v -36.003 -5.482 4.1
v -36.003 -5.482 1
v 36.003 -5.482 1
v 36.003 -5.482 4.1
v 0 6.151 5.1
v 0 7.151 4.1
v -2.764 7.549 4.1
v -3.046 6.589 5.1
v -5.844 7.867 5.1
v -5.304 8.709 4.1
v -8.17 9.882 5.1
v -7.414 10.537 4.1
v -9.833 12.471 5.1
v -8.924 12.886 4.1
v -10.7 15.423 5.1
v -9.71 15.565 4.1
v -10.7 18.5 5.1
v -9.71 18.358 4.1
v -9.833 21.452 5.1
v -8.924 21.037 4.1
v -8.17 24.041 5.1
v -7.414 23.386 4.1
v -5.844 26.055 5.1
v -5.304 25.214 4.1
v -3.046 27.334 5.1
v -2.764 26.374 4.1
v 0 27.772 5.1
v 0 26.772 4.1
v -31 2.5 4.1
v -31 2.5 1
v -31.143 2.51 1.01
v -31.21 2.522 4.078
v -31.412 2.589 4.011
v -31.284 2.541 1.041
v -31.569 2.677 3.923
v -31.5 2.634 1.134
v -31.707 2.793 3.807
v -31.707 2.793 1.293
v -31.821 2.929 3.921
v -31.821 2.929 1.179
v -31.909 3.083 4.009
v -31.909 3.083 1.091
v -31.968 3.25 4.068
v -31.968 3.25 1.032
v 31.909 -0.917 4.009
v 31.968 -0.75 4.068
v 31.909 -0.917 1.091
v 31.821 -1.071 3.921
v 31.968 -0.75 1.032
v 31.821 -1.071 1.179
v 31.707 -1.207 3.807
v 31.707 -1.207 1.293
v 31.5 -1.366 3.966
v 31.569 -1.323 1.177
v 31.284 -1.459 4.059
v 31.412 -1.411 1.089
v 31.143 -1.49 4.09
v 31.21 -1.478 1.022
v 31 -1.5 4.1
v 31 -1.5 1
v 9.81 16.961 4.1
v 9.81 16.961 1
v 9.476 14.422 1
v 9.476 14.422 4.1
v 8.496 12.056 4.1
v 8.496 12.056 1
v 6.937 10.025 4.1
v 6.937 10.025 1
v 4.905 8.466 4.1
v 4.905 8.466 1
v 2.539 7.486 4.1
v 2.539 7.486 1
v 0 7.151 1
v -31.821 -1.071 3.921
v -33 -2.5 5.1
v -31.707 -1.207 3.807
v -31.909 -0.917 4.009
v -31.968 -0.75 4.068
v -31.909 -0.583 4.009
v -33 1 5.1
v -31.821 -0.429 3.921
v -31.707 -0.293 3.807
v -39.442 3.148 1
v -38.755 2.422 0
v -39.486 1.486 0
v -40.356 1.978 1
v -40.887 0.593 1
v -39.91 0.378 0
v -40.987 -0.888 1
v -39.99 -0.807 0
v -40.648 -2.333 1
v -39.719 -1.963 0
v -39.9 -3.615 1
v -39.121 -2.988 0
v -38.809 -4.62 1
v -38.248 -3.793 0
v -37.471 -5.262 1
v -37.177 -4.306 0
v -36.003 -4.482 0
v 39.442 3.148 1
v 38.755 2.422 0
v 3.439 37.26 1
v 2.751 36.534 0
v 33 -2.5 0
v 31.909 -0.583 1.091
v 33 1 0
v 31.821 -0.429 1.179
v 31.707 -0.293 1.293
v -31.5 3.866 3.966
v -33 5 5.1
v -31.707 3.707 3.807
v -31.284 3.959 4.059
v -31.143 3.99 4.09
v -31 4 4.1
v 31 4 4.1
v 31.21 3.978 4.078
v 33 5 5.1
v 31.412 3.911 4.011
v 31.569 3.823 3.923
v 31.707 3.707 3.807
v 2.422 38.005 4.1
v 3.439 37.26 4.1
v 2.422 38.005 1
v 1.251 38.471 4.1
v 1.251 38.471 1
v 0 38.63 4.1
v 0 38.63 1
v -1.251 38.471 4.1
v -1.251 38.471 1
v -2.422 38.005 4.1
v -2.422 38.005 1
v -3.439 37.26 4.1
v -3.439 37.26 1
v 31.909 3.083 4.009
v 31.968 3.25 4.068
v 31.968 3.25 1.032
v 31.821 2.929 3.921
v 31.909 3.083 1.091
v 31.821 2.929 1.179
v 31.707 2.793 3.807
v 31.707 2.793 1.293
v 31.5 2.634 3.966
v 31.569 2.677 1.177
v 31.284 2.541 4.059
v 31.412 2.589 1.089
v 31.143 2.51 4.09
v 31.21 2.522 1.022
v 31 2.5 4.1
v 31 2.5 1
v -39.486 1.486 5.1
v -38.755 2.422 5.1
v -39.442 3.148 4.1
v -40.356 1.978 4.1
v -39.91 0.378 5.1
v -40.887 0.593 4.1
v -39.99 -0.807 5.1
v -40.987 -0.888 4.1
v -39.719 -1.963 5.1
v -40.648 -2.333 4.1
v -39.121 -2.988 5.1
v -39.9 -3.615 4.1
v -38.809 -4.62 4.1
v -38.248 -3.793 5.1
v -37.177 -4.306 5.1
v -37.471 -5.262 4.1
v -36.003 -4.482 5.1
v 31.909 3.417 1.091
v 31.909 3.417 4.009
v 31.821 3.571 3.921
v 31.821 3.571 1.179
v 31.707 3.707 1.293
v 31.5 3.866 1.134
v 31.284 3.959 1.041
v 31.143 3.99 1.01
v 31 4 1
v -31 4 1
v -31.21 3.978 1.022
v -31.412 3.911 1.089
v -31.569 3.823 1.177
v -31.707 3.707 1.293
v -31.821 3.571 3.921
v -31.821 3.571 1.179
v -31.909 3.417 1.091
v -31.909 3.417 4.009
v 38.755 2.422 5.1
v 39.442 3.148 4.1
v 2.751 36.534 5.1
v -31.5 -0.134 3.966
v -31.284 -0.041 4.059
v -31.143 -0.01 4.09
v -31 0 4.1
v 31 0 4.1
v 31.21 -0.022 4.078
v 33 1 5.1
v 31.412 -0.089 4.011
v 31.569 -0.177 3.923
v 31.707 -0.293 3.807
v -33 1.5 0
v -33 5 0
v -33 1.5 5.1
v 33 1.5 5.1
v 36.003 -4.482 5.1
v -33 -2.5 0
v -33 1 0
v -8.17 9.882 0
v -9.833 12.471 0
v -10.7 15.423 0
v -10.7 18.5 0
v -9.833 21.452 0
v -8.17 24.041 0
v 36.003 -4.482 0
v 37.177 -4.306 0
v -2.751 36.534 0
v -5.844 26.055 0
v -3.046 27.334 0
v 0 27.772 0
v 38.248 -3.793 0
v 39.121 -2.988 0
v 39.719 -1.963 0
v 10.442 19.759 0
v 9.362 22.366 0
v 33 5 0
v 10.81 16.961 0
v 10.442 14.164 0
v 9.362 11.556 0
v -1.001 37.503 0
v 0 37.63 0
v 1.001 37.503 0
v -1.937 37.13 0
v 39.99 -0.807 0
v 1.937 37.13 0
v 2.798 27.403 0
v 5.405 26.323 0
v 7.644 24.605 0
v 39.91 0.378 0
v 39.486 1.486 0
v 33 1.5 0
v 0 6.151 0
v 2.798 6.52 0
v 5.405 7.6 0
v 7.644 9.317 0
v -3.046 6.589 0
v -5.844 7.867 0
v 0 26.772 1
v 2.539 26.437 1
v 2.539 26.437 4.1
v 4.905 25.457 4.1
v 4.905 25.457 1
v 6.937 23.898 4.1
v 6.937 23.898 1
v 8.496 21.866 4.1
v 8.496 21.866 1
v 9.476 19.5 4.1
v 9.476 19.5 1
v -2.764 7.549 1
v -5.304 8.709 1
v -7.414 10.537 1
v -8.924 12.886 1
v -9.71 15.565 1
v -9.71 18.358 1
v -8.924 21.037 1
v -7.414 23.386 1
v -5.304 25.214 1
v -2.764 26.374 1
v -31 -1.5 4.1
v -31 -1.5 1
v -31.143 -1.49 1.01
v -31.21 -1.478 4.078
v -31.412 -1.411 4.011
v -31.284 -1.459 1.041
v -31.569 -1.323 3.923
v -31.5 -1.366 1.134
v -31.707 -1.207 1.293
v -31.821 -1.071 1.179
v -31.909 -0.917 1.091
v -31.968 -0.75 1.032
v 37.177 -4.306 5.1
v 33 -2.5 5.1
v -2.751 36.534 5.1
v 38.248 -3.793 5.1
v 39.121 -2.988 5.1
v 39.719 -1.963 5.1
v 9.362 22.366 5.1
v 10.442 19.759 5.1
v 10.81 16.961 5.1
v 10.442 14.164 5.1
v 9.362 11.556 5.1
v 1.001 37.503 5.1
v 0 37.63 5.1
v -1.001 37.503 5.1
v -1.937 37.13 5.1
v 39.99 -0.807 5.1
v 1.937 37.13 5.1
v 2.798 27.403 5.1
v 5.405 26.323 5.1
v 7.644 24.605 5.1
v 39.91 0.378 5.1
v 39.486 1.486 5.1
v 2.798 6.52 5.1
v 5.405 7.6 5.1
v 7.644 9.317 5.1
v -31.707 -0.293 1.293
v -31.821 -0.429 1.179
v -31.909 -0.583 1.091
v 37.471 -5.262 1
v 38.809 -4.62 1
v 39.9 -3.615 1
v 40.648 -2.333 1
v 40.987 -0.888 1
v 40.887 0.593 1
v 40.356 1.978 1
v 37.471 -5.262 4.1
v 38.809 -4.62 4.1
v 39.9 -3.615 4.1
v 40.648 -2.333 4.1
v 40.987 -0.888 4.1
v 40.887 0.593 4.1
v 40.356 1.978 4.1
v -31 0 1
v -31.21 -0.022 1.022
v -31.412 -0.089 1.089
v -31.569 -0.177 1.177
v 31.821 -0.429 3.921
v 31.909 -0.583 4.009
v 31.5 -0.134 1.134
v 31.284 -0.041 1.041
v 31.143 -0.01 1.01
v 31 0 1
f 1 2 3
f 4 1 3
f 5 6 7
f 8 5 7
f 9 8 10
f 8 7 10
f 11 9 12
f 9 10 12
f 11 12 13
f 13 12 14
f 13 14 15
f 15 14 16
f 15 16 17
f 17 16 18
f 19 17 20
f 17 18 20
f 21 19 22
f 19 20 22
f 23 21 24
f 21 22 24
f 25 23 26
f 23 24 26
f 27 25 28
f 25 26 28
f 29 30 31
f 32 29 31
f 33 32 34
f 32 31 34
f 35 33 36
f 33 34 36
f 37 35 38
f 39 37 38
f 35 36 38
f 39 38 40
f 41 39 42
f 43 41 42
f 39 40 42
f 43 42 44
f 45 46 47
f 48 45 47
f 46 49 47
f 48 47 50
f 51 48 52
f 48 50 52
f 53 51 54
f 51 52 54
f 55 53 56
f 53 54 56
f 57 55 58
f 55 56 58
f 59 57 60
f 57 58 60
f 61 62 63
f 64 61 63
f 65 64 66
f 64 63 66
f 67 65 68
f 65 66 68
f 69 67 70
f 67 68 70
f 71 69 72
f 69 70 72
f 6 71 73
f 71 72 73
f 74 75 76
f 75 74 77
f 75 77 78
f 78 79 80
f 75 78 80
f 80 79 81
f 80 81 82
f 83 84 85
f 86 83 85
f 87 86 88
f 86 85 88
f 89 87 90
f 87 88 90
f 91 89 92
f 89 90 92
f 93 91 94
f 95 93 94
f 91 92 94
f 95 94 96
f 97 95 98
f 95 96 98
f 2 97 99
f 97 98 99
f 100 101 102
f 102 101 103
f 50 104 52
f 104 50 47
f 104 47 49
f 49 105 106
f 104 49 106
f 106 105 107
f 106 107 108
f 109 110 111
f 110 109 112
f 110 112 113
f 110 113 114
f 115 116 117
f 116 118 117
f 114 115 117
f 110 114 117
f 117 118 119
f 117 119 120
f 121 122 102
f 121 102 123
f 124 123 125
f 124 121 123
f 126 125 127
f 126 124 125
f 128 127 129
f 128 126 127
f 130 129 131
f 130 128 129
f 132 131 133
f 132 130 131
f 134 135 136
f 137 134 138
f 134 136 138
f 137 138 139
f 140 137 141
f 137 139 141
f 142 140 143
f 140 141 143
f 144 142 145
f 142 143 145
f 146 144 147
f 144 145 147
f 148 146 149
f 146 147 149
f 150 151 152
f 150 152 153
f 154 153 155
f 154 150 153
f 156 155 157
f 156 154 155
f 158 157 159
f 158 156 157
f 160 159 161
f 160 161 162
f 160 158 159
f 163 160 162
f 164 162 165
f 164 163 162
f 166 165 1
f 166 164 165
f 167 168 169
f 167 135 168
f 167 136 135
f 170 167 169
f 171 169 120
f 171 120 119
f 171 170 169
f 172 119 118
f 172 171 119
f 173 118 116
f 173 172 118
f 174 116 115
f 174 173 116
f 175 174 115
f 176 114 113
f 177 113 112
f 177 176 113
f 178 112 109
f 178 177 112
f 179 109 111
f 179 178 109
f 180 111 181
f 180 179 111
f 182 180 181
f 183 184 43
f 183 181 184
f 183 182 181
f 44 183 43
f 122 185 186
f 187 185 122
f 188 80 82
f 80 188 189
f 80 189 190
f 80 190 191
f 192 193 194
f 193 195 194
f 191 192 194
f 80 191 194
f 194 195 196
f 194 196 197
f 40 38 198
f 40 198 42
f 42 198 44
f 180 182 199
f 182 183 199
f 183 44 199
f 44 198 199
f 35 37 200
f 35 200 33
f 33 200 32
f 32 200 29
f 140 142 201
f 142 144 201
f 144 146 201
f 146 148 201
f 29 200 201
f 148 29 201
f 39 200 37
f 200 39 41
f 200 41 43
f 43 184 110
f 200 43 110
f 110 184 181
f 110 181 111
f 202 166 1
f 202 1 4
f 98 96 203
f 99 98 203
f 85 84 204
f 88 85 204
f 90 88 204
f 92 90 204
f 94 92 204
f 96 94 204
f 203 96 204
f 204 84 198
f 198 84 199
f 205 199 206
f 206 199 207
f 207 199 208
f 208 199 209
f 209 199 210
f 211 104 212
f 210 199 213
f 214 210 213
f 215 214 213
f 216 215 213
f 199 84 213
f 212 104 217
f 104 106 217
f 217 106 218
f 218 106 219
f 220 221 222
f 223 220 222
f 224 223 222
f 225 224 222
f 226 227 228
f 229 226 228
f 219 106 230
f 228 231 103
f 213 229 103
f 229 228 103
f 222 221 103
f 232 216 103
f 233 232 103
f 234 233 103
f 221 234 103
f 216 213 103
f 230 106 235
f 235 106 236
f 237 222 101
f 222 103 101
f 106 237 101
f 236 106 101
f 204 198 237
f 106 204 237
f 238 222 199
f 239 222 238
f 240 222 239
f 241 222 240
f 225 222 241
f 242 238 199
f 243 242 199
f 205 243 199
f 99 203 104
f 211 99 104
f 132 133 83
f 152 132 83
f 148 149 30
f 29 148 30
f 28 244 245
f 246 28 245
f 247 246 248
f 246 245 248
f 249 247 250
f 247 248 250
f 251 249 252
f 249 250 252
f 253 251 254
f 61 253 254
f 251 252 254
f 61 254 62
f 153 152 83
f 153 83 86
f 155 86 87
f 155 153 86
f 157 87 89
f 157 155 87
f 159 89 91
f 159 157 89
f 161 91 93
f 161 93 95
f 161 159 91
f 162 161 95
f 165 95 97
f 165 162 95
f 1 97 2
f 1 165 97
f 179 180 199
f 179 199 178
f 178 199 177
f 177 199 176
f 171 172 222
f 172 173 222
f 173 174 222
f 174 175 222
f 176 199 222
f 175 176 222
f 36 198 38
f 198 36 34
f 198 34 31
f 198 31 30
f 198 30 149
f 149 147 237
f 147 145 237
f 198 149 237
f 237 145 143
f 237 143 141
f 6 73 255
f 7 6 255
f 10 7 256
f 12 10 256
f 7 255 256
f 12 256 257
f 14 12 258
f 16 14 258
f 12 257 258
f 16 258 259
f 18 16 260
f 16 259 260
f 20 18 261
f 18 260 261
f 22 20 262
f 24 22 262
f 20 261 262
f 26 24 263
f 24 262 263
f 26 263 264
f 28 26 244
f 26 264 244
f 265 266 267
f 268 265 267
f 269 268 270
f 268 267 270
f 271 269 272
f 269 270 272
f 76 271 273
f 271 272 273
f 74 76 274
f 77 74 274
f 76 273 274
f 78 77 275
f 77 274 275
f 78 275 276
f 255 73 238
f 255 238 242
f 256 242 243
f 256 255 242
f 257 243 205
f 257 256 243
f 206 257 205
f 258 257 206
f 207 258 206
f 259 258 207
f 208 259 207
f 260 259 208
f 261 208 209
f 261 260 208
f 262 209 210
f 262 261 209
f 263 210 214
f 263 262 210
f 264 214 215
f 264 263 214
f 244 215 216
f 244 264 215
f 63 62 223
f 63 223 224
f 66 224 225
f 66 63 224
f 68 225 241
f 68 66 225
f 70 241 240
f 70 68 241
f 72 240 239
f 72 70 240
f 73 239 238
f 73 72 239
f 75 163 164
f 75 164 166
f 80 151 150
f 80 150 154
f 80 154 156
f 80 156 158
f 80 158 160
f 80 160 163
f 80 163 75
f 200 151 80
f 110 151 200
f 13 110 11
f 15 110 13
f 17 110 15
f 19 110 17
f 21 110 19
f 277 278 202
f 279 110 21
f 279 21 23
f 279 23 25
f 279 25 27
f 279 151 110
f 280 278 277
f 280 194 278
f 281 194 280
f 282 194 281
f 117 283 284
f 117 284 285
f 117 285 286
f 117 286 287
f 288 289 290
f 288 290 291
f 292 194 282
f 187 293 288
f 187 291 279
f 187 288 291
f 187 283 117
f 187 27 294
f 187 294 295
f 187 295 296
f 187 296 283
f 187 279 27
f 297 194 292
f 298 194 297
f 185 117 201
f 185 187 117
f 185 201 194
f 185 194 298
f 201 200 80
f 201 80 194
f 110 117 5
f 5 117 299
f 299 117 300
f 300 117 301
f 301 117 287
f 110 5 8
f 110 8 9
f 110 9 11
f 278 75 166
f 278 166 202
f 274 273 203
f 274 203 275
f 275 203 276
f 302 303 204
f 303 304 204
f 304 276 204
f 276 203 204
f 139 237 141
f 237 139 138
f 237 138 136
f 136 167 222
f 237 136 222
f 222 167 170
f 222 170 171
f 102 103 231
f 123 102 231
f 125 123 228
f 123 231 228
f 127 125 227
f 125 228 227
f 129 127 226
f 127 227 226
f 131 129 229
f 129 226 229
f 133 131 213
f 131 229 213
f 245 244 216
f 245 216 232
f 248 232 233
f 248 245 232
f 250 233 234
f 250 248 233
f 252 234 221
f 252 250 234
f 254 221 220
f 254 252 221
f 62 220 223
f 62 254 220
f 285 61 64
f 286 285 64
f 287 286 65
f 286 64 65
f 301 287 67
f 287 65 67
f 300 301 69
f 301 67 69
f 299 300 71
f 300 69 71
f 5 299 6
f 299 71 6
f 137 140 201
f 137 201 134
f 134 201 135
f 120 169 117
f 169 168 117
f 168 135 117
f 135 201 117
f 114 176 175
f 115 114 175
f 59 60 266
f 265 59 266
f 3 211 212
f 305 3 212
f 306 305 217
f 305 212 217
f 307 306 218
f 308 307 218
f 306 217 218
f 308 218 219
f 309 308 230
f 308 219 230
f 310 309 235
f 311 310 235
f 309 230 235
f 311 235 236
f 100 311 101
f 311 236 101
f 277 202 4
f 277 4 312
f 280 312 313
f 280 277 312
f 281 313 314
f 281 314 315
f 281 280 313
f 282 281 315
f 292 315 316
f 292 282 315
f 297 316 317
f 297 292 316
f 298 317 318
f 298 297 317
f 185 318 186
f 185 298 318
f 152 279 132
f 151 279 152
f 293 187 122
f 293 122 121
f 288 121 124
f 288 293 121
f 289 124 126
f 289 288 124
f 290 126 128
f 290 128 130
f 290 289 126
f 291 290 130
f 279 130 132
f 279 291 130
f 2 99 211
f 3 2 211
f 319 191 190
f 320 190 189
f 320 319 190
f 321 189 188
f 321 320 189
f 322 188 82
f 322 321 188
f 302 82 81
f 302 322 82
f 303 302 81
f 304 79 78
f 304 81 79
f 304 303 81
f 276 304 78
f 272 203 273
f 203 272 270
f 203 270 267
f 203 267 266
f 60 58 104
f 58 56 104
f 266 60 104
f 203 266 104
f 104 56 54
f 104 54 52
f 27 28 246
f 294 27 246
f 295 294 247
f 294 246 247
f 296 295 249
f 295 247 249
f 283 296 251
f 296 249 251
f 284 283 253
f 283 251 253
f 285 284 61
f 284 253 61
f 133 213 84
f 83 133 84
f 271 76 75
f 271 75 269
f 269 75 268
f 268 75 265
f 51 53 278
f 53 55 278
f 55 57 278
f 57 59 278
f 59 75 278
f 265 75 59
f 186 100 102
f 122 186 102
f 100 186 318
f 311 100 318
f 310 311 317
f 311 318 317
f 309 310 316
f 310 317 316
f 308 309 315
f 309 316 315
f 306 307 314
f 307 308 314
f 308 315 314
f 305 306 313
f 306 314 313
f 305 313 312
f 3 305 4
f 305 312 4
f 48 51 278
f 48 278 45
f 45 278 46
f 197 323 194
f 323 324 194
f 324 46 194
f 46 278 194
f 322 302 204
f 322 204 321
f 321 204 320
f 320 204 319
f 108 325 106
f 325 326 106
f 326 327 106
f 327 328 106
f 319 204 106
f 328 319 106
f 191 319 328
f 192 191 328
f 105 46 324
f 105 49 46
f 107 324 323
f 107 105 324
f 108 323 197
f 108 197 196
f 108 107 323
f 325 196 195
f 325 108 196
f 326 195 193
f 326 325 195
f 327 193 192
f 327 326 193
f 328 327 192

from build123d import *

# Parameters (mm, degrees)
F1_DEPTH      = 5.1
F2_R          = 5
F3_SIZE       = 1
F4_T4_DEPTH   = 8.1
F4_T10_DEPTH  = 8.1
F4_T16_DEPTH  = 8.1
F4_T24_DEPTH  = 8.1
F4_T30_DEPTH  = 8.1
F4_T36_DEPTH  = 8.1
F4_T42_DEPTH  = 8.1
F4_T48_DEPTH  = 8.1
F4_T56_DEPTH  = 8.1
F4_T62_DEPTH  = 8.1
F4_T68_DEPTH  = 8.1
F4_T74_DEPTH  = 8.1
F4_T80_DEPTH  = 8.1
F4_T88_DEPTH  = 8.1
F4_T94_DEPTH  = 8.1
F4_T100_DEPTH = 8.1
F4_T106_DEPTH = 8.1
F4_T112_DEPTH = 8.1
F4_T120_DEPTH = 8.1
F4_T126_DEPTH = 8.1
F4_T132_DEPTH = 8.1
F4_T138_DEPTH = 8.1
F4_T144_DEPTH = 8.1
F4_T152_DEPTH = 8.1
F4_T158_DEPTH = 8.1
F4_T164_DEPTH = 8.1
F4_T170_DEPTH = 8.1
F4_T176_DEPTH = 8.1
F4_T184_DEPTH = 8.1
F4_T190_DEPTH = 8.1
F4_T196_DEPTH = 8.1
F4_T202_DEPTH = 8.1
F4_T208_DEPTH = 8.1
F4_T216_DEPTH = 8.1
F4_T222_DEPTH = 8.1
F4_T228_DEPTH = 8.1
F4_T234_DEPTH = 8.1
F4_T240_DEPTH = 8.1
F4_T248_DEPTH = 8.1
F4_T254_DEPTH = 8.1


# Not quite as in the source:
# - a fillet or chamfer that OpenCascade refuses, or shapes differently, is made with other operations: its cross-section is extruded or revolved along the edge and cut away or added


with BuildPart() as f1:
    # F0 (on Top) → F1 (new body)
    with BuildSketch(Plane.XY):
        with BuildLine():
            Line((0, 2.5), (0, 0))
            Line((0, 0), (32, 0))
            Line((32, 0), (32, -1.5))
            Line((32, -1.5), (0, -1.5))
            Line((0, -1.5), (0, -5.4818979414))
            Line((0, -5.4818979414), (48.5503548798, -5.4818979414))
            Line((48.5503548798, -5.4818979414), (0, 40.5181020586))
            Line((0, 40.5181020586), (0, 26.7715353826))
            ThreePointArc((0, 26.7715353826), (6.9368136311, 23.8982130969), (9.8101359168, 16.9613994658))
            ThreePointArc((9.8101359168, 16.9613994658), (6.9368136311, 10.0245858347), (0, 7.151263549))
            Line((0, 7.151263549), (0, 4))
            Line((0, 4), (32, 4))
            Line((32, 4), (32, 2.5))
            Line((32, 2.5), (0, 2.5))
        make_face()
        with BuildLine():
            Line((-32, -1.5), (-32, 0))
            Line((-32, 0), (0, 0))
            Line((0, 0), (0, 2.5))
            Line((0, 2.5), (-32, 2.5))
            Line((-32, 2.5), (-32, 4))
            Line((-32, 4), (0, 4))
            Line((0, 4), (0, 7.151263549))
            ThreePointArc((0, 7.151263549), (-9.8101359168, 16.9613994658), (0, 26.7715353826))
            Line((0, 26.7715353826), (0, 40.5181020586))
            Line((0, 40.5181020586), (-48.5503548798, -5.4818979414))
            Line((-48.5503548798, -5.4818979414), (0, -5.4818979414))
            Line((0, -5.4818979414), (0, -1.5))
            Line((0, -1.5), (-32, -1.5))
        make_face()
    extrude(amount=F1_DEPTH)

    # F2
    f2_edges = [f1.edges().sort_by_distance(p)[0] for p in [
        (-48.550355, -5.481898, 2.55),
        (48.550355, -5.481898, 2.55),
        (0, 40.518102, 2.55),
    ]]
    fillet(f2_edges, radius=F2_R)

    # F3
    f3_edges = [f1.edges().sort_by_distance(p)[0] for p in [
        (21.440624, 20.203756, 5.1),
        (40.648189, -2.332857, 5.1),
        (0, 38.630252, 5.1),
        (0, -5.481898, 5.1),
        (-21.440624, 20.203756, 5.1),
        (-40.648189, -2.332857, 5.1),
        (32, 3.25, 5.1),
        (0, 2.5, 5.1),
        (-32, 3.25, 5.1),
        (0, 4, 5.1),
        (32, -0.75, 5.1),
        (0, -1.5, 5.1),
        (-32, -0.75, 5.1),
        (0, 0, 5.1),
        (-9.810136, 16.961399, 5.1),
        (21.440624, 20.203756, 0),
        (40.648189, -2.332857, 0),
        (0, 38.630252, 0),
        (0, -5.481898, 0),
        (-21.440624, 20.203756, 0),
        (-40.648189, -2.332857, 0),
        (32, 3.25, 0),
        (0, 2.5, 0),
        (-32, 3.25, 0),
        (0, 4, 0),
        (32, -0.75, 0),
        (0, -1.5, 0),
        (-32, -0.75, 0),
        (0, 0, 0),
        (-9.810136, 16.961399, 0),
    ]]
    chamfer(f3_edges, length=F3_SIZE)

    # F4: fillet of radius 1 on 8 edges, made by hand


with BuildPart() as f4_tool2:
    # F4_s3 → F4_t4 (new body)
    with BuildSketch(Plane.XY.offset(-1.5)):
        with BuildLine():
            ThreePointArc((32, 3.5), (31.7071067812, 2.7928932188), (31, 2.5))
            Line((31, 2.5), (32, 2.5))
            Line((32, 2.5), (32, 3.5))
        make_face()
    extrude(amount=F4_T4_DEPTH)

    split(bisect_by=Plane(origin=(16.5, 0, 16.5), x_dir=(0, 1, 0), z_dir=(-0.7071067812, 0, -0.7071067812)), keep=Keep.TOP)

    split(bisect_by=Plane(origin=(0, 0.75, -0.75), x_dir=(1, 0, 0), z_dir=(0, -0.7071067812, 0.7071067812)), keep=Keep.TOP)


with BuildPart() as f1_1:
    add(f1.part)

    # F4_t1: union F4_tool2
    add(f4_tool2.part)


with BuildPart() as f4_tool8:
    # F4_s9 → F4_t10 (new body)
    with BuildSketch(Plane.XY.offset(-1.5)):
        with BuildLine():
            ThreePointArc((32, 3.5), (31.7071067812, 2.7928932188), (31, 2.5))
            Line((31, 2.5), (32, 2.5))
            Line((32, 2.5), (32, 3.5))
        make_face()
    extrude(amount=F4_T10_DEPTH)

    split(bisect_by=Plane(origin=(16.5, 0, 16.5), x_dir=(0, 1, 0), z_dir=(0.7071067812, 0, 0.7071067812)), keep=Keep.TOP)

    split(bisect_by=Plane(origin=(0, 0.75, -0.75), x_dir=(1, 0, 0), z_dir=(0, 0.7071067812, -0.7071067812)), keep=Keep.TOP)


with BuildPart() as f1_2:
    add(f1_1.part)

    # F4_t7: union F4_tool8
    add(f4_tool8.part)


with BuildPart() as f4_tool14:
    # F4_s15 → F4_t16 (new body)
    with BuildSketch(Plane.XY.offset(-1.5)):
        with BuildLine():
            ThreePointArc((32, 3.5), (31.7071067812, 2.7928932188), (31, 2.5))
            Line((31, 2.5), (32, 2.5))
            Line((32, 2.5), (32, 3.5))
        make_face()
    extrude(amount=F4_T16_DEPTH)

    split(bisect_by=Plane(origin=(16.5, 0, 16.5), x_dir=(0, 1, 0), z_dir=(0.7071067812, 0, 0.7071067812)), keep=Keep.TOP)

    split(bisect_by=Plane(origin=(0, 0.75, -0.75), x_dir=(1, 0, 0), z_dir=(0, -0.7071067812, 0.7071067812)), keep=Keep.TOP)

    split(bisect_by=Plane(origin=(13.95, 0, -13.95), x_dir=(0, 1, 0), z_dir=(0.7071067812, 0, -0.7071067812)), keep=Keep.TOP)

    split(bisect_by=Plane(origin=(0, 3.3, 3.3), x_dir=(1, 0, 0), z_dir=(0, -0.7071067812, -0.7071067812)), keep=Keep.TOP)


with BuildPart() as f1_3:
    add(f1_2.part)

    # F4_t13: union F4_tool14
    add(f4_tool14.part)


with BuildPart() as f4_tool22:
    # F4_s23 → F4_t24 (new body)
    with BuildSketch(Plane.XY.offset(-1.5)):
        with BuildLine():
            ThreePointArc((32, 3.5), (31.7071067812, 2.7928932188), (31, 2.5))
            Line((31, 2.5), (32, 2.5))
            Line((32, 2.5), (32, 3.5))
        make_face()
    extrude(amount=F4_T24_DEPTH)

    split(bisect_by=Plane(origin=(13.95, 0, -13.95), x_dir=(0, 1, 0), z_dir=(-0.7071067812, 0, 0.7071067812)), keep=Keep.TOP)

    split(bisect_by=Plane(origin=(0, 3.3, 3.3), x_dir=(1, 0, 0), z_dir=(0, -0.7071067812, -0.7071067812)), keep=Keep.TOP)


with BuildPart() as f1_4:
    add(f1_3.part)

    # F4_t21: union F4_tool22
    add(f4_tool22.part)


with BuildPart() as f4_tool28:
    # F4_s29 → F4_t30 (new body)
    with BuildSketch(Plane.XY.offset(-1.5)):
        with BuildLine():
            ThreePointArc((32, 3.5), (31.7071067812, 2.7928932188), (31, 2.5))
            Line((31, 2.5), (32, 2.5))
            Line((32, 2.5), (32, 3.5))
        make_face()
    extrude(amount=F4_T30_DEPTH)

    split(bisect_by=Plane(origin=(13.95, 0, -13.95), x_dir=(0, 1, 0), z_dir=(0.7071067812, 0, -0.7071067812)), keep=Keep.TOP)

    split(bisect_by=Plane(origin=(0, 3.3, 3.3), x_dir=(1, 0, 0), z_dir=(0, 0.7071067812, 0.7071067812)), keep=Keep.TOP)


with BuildPart() as f1_5:
    add(f1_4.part)

    # F4_t27: union F4_tool28
    add(f4_tool28.part)


with BuildPart() as f4_tool34:
    # F4_s35 → F4_t36 (new body)
    with BuildSketch(Plane.XY.offset(-1.5)):
        with BuildLine():
            ThreePointArc((32, -1), (31.7071067812, -0.2928932188), (31, 0))
            Line((31, 0), (32, 0))
            Line((32, 0), (32, -1))
        make_face()
    extrude(amount=F4_T36_DEPTH)

    split(bisect_by=Plane(origin=(16.5, 0, 16.5), x_dir=(0, 1, 0), z_dir=(-0.7071067812, 0, -0.7071067812)), keep=Keep.TOP)

    split(bisect_by=Plane(origin=(0, 0.5, 0.5), x_dir=(1, 0, 0), z_dir=(0, 0.7071067812, 0.7071067812)), keep=Keep.TOP)


with BuildPart() as f1_6:
    add(f1_5.part)

    # F4_t33: union F4_tool34
    add(f4_tool34.part)


with BuildPart() as f4_tool40:
    # F4_s41 → F4_t42 (new body)
    with BuildSketch(Plane.XY.offset(-1.5)):
        with BuildLine():
            ThreePointArc((32, -1), (31.7071067812, -0.2928932188), (31, 0))
            Line((31, 0), (32, 0))
            Line((32, 0), (32, -1))
        make_face()
    extrude(amount=F4_T42_DEPTH)

    split(bisect_by=Plane(origin=(16.5, 0, 16.5), x_dir=(0, 1, 0), z_dir=(0.7071067812, 0, 0.7071067812)), keep=Keep.TOP)

    split(bisect_by=Plane(origin=(0, 0.5, 0.5), x_dir=(1, 0, 0), z_dir=(0, -0.7071067812, -0.7071067812)), keep=Keep.TOP)


with BuildPart() as f1_7:
    add(f1_6.part)

    # F4_t39: union F4_tool40
    add(f4_tool40.part)


with BuildPart() as f4_tool46:
    # F4_s47 → F4_t48 (new body)
    with BuildSketch(Plane.XY.offset(-1.5)):
        with BuildLine():
            ThreePointArc((32, -1), (31.7071067812, -0.2928932188), (31, 0))
            Line((31, 0), (32, 0))
            Line((32, 0), (32, -1))
        make_face()
    extrude(amount=F4_T48_DEPTH)

    split(bisect_by=Plane(origin=(16.5, 0, 16.5), x_dir=(0, 1, 0), z_dir=(0.7071067812, 0, 0.7071067812)), keep=Keep.TOP)

    split(bisect_by=Plane(origin=(0, 0.5, 0.5), x_dir=(1, 0, 0), z_dir=(0, 0.7071067812, 0.7071067812)), keep=Keep.TOP)

    split(bisect_by=Plane(origin=(13.95, 0, -13.95), x_dir=(0, 1, 0), z_dir=(0.7071067812, 0, -0.7071067812)), keep=Keep.TOP)

    split(bisect_by=Plane(origin=(0, -2.05, 2.05), x_dir=(1, 0, 0), z_dir=(0, 0.7071067812, -0.7071067812)), keep=Keep.TOP)


with BuildPart() as f1_8:
    add(f1_7.part)

    # F4_t45: union F4_tool46
    add(f4_tool46.part)


with BuildPart() as f4_tool54:
    # F4_s55 → F4_t56 (new body)
    with BuildSketch(Plane.XY.offset(-1.5)):
        with BuildLine():
            ThreePointArc((32, -1), (31.7071067812, -0.2928932188), (31, 0))
            Line((31, 0), (32, 0))
            Line((32, 0), (32, -1))
        make_face()
    extrude(amount=F4_T56_DEPTH)

    split(bisect_by=Plane(origin=(13.95, 0, -13.95), x_dir=(0, 1, 0), z_dir=(-0.7071067812, 0, 0.7071067812)), keep=Keep.TOP)

    split(bisect_by=Plane(origin=(0, -2.05, 2.05), x_dir=(1, 0, 0), z_dir=(0, 0.7071067812, -0.7071067812)), keep=Keep.TOP)


with BuildPart() as f1_9:
    add(f1_8.part)

    # F4_t53: union F4_tool54
    add(f4_tool54.part)


with BuildPart() as f4_tool60:
    # F4_s61 → F4_t62 (new body)
    with BuildSketch(Plane.XY.offset(-1.5)):
        with BuildLine():
            ThreePointArc((32, -1), (31.7071067812, -0.2928932188), (31, 0))
            Line((31, 0), (32, 0))
            Line((32, 0), (32, -1))
        make_face()
    extrude(amount=F4_T62_DEPTH)

    split(bisect_by=Plane(origin=(13.95, 0, -13.95), x_dir=(0, 1, 0), z_dir=(0.7071067812, 0, -0.7071067812)), keep=Keep.TOP)

    split(bisect_by=Plane(origin=(0, -2.05, 2.05), x_dir=(1, 0, 0), z_dir=(0, -0.7071067812, 0.7071067812)), keep=Keep.TOP)


with BuildPart() as f1_10:
    add(f1_9.part)

    # F4_t59: union F4_tool60
    add(f4_tool60.part)


with BuildPart() as f4_tool66:
    # F4_s67 → F4_t68 (new body)
    with BuildSketch(Plane.XY.offset(-1.5)):
        with BuildLine():
            ThreePointArc((32, -0.5), (31.7071067812, -1.2071067812), (31, -1.5))
            Line((31, -1.5), (32, -1.5))
            Line((32, -1.5), (32, -0.5))
        make_face()
    extrude(amount=F4_T68_DEPTH)

    split(bisect_by=Plane(origin=(16.5, 0, 16.5), x_dir=(0, 1, 0), z_dir=(-0.7071067812, 0, -0.7071067812)), keep=Keep.TOP)

    split(bisect_by=Plane(origin=(0, -1.25, 1.25), x_dir=(1, 0, 0), z_dir=(0, -0.7071067812, 0.7071067812)), keep=Keep.TOP)


with BuildPart() as f1_11:
    add(f1_10.part)

    # F4_t65: union F4_tool66
    add(f4_tool66.part)


with BuildPart() as f4_tool72:
    # F4_s73 → F4_t74 (new body)
    with BuildSketch(Plane.XY.offset(-1.5)):
        with BuildLine():
            ThreePointArc((32, -0.5), (31.7071067812, -1.2071067812), (31, -1.5))
            Line((31, -1.5), (32, -1.5))
            Line((32, -1.5), (32, -0.5))
        make_face()
    extrude(amount=F4_T74_DEPTH)

    split(bisect_by=Plane(origin=(16.5, 0, 16.5), x_dir=(0, 1, 0), z_dir=(0.7071067812, 0, 0.7071067812)), keep=Keep.TOP)

    split(bisect_by=Plane(origin=(0, -1.25, 1.25), x_dir=(1, 0, 0), z_dir=(0, 0.7071067812, -0.7071067812)), keep=Keep.TOP)


with BuildPart() as f1_12:
    add(f1_11.part)

    # F4_t71: union F4_tool72
    add(f4_tool72.part)


with BuildPart() as f4_tool78:
    # F4_s79 → F4_t80 (new body)
    with BuildSketch(Plane.XY.offset(-1.5)):
        with BuildLine():
            ThreePointArc((32, -0.5), (31.7071067812, -1.2071067812), (31, -1.5))
            Line((31, -1.5), (32, -1.5))
            Line((32, -1.5), (32, -0.5))
        make_face()
    extrude(amount=F4_T80_DEPTH)

    split(bisect_by=Plane(origin=(16.5, 0, 16.5), x_dir=(0, 1, 0), z_dir=(0.7071067812, 0, 0.7071067812)), keep=Keep.TOP)

    split(bisect_by=Plane(origin=(0, -1.25, 1.25), x_dir=(1, 0, 0), z_dir=(0, -0.7071067812, 0.7071067812)), keep=Keep.TOP)

    split(bisect_by=Plane(origin=(13.95, 0, -13.95), x_dir=(0, 1, 0), z_dir=(0.7071067812, 0, -0.7071067812)), keep=Keep.TOP)

    split(bisect_by=Plane(origin=(0, 1.3, 1.3), x_dir=(1, 0, 0), z_dir=(0, -0.7071067812, -0.7071067812)), keep=Keep.TOP)


with BuildPart() as f1_13:
    add(f1_12.part)

    # F4_t77: union F4_tool78
    add(f4_tool78.part)


with BuildPart() as f4_tool86:
    # F4_s87 → F4_t88 (new body)
    with BuildSketch(Plane.XY.offset(-1.5)):
        with BuildLine():
            ThreePointArc((32, -0.5), (31.7071067812, -1.2071067812), (31, -1.5))
            Line((31, -1.5), (32, -1.5))
            Line((32, -1.5), (32, -0.5))
        make_face()
    extrude(amount=F4_T88_DEPTH)

    split(bisect_by=Plane(origin=(13.95, 0, -13.95), x_dir=(0, 1, 0), z_dir=(-0.7071067812, 0, 0.7071067812)), keep=Keep.TOP)

    split(bisect_by=Plane(origin=(0, 1.3, 1.3), x_dir=(1, 0, 0), z_dir=(0, -0.7071067812, -0.7071067812)), keep=Keep.TOP)


with BuildPart() as f1_14:
    add(f1_13.part)

    # F4_t85: union F4_tool86
    add(f4_tool86.part)


with BuildPart() as f4_tool92:
    # F4_s93 → F4_t94 (new body)
    with BuildSketch(Plane.XY.offset(-1.5)):
        with BuildLine():
            ThreePointArc((32, -0.5), (31.7071067812, -1.2071067812), (31, -1.5))
            Line((31, -1.5), (32, -1.5))
            Line((32, -1.5), (32, -0.5))
        make_face()
    extrude(amount=F4_T94_DEPTH)

    split(bisect_by=Plane(origin=(13.95, 0, -13.95), x_dir=(0, 1, 0), z_dir=(0.7071067812, 0, -0.7071067812)), keep=Keep.TOP)

    split(bisect_by=Plane(origin=(0, 1.3, 1.3), x_dir=(1, 0, 0), z_dir=(0, 0.7071067812, 0.7071067812)), keep=Keep.TOP)


with BuildPart() as f1_15:
    add(f1_14.part)

    # F4_t91: union F4_tool92
    add(f4_tool92.part)


with BuildPart() as f4_tool98:
    # F4_s99 → F4_t100 (new body)
    with BuildSketch(Plane.XY.offset(-1.5)):
        with BuildLine():
            ThreePointArc((32, 3), (31.7071067812, 3.7071067812), (31, 4))
            Line((31, 4), (32, 4))
            Line((32, 4), (32, 3))
        make_face()
    extrude(amount=F4_T100_DEPTH)

    split(bisect_by=Plane(origin=(16.5, 0, 16.5), x_dir=(0, 1, 0), z_dir=(-0.7071067812, 0, -0.7071067812)), keep=Keep.TOP)

    split(bisect_by=Plane(origin=(0, 2.5, 2.5), x_dir=(1, 0, 0), z_dir=(0, 0.7071067812, 0.7071067812)), keep=Keep.TOP)


with BuildPart() as f1_16:
    add(f1_15.part)

    # F4_t97: union F4_tool98
    add(f4_tool98.part)


with BuildPart() as f4_tool104:
    # F4_s105 → F4_t106 (new body)
    with BuildSketch(Plane.XY.offset(-1.5)):
        with BuildLine():
            ThreePointArc((32, 3), (31.7071067812, 3.7071067812), (31, 4))
            Line((31, 4), (32, 4))
            Line((32, 4), (32, 3))
        make_face()
    extrude(amount=F4_T106_DEPTH)

    split(bisect_by=Plane(origin=(16.5, 0, 16.5), x_dir=(0, 1, 0), z_dir=(0.7071067812, 0, 0.7071067812)), keep=Keep.TOP)

    split(bisect_by=Plane(origin=(0, 2.5, 2.5), x_dir=(1, 0, 0), z_dir=(0, -0.7071067812, -0.7071067812)), keep=Keep.TOP)


with BuildPart() as f1_17:
    add(f1_16.part)

    # F4_t103: union F4_tool104
    add(f4_tool104.part)


with BuildPart() as f4_tool110:
    # F4_s111 → F4_t112 (new body)
    with BuildSketch(Plane.XY.offset(-1.5)):
        with BuildLine():
            ThreePointArc((32, 3), (31.7071067812, 3.7071067812), (31, 4))
            Line((31, 4), (32, 4))
            Line((32, 4), (32, 3))
        make_face()
    extrude(amount=F4_T112_DEPTH)

    split(bisect_by=Plane(origin=(16.5, 0, 16.5), x_dir=(0, 1, 0), z_dir=(0.7071067812, 0, 0.7071067812)), keep=Keep.TOP)

    split(bisect_by=Plane(origin=(0, 2.5, 2.5), x_dir=(1, 0, 0), z_dir=(0, 0.7071067812, 0.7071067812)), keep=Keep.TOP)

    split(bisect_by=Plane(origin=(13.95, 0, -13.95), x_dir=(0, 1, 0), z_dir=(0.7071067812, 0, -0.7071067812)), keep=Keep.TOP)

    split(bisect_by=Plane(origin=(0, -0.05, 0.05), x_dir=(1, 0, 0), z_dir=(0, 0.7071067812, -0.7071067812)), keep=Keep.TOP)


with BuildPart() as f1_18:
    add(f1_17.part)

    # F4_t109: union F4_tool110
    add(f4_tool110.part)


with BuildPart() as f4_tool118:
    # F4_s119 → F4_t120 (new body)
    with BuildSketch(Plane.XY.offset(-1.5)):
        with BuildLine():
            ThreePointArc((32, 3), (31.7071067812, 3.7071067812), (31, 4))
            Line((31, 4), (32, 4))
            Line((32, 4), (32, 3))
        make_face()
    extrude(amount=F4_T120_DEPTH)

    split(bisect_by=Plane(origin=(13.95, 0, -13.95), x_dir=(0, 1, 0), z_dir=(-0.7071067812, 0, 0.7071067812)), keep=Keep.TOP)

    split(bisect_by=Plane(origin=(0, -0.05, 0.05), x_dir=(1, 0, 0), z_dir=(0, 0.7071067812, -0.7071067812)), keep=Keep.TOP)


with BuildPart() as f1_19:
    add(f1_18.part)

    # F4_t117: union F4_tool118
    add(f4_tool118.part)


with BuildPart() as f4_tool124:
    # F4_s125 → F4_t126 (new body)
    with BuildSketch(Plane.XY.offset(-1.5)):
        with BuildLine():
            ThreePointArc((32, 3), (31.7071067812, 3.7071067812), (31, 4))
            Line((31, 4), (32, 4))
            Line((32, 4), (32, 3))
        make_face()
    extrude(amount=F4_T126_DEPTH)

    split(bisect_by=Plane(origin=(13.95, 0, -13.95), x_dir=(0, 1, 0), z_dir=(0.7071067812, 0, -0.7071067812)), keep=Keep.TOP)

    split(bisect_by=Plane(origin=(0, -0.05, 0.05), x_dir=(1, 0, 0), z_dir=(0, -0.7071067812, 0.7071067812)), keep=Keep.TOP)


with BuildPart() as f1_20:
    add(f1_19.part)

    # F4_t123: union F4_tool124
    add(f4_tool124.part)


with BuildPart() as f4_tool130:
    # F4_s131 → F4_t132 (new body)
    with BuildSketch(Plane.XY.offset(-1.5)):
        with BuildLine():
            ThreePointArc((-31, -1.5), (-31.7071067812, -1.2071067812), (-32, -0.5))
            Line((-32, -0.5), (-32, -1.5))
            Line((-32, -1.5), (-31, -1.5))
        make_face()
    extrude(amount=F4_T132_DEPTH)

    split(bisect_by=Plane(origin=(0, -1.25, 1.25), x_dir=(1, 0, 0), z_dir=(0, 0.7071067812, -0.7071067812)), keep=Keep.TOP)

    split(bisect_by=Plane(origin=(-16.5, 0, 16.5), x_dir=(0, 1, 0), z_dir=(-0.7071067812, 0, 0.7071067812)), keep=Keep.TOP)


with BuildPart() as f1_21:
    add(f1_20.part)

    # F4_t129: union F4_tool130
    add(f4_tool130.part)


with BuildPart() as f4_tool136:
    # F4_s137 → F4_t138 (new body)
    with BuildSketch(Plane.XY.offset(-1.5)):
        with BuildLine():
            ThreePointArc((-31, -1.5), (-31.7071067812, -1.2071067812), (-32, -0.5))
            Line((-32, -0.5), (-32, -1.5))
            Line((-32, -1.5), (-31, -1.5))
        make_face()
    extrude(amount=F4_T138_DEPTH)

    split(bisect_by=Plane(origin=(0, -1.25, 1.25), x_dir=(1, 0, 0), z_dir=(0, -0.7071067812, 0.7071067812)), keep=Keep.TOP)

    split(bisect_by=Plane(origin=(-16.5, 0, 16.5), x_dir=(0, 1, 0), z_dir=(0.7071067812, 0, -0.7071067812)), keep=Keep.TOP)


with BuildPart() as f1_22:
    add(f1_21.part)

    # F4_t135: union F4_tool136
    add(f4_tool136.part)


with BuildPart() as f4_tool142:
    # F4_s143 → F4_t144 (new body)
    with BuildSketch(Plane.XY.offset(-1.5)):
        with BuildLine():
            ThreePointArc((-31, -1.5), (-31.7071067812, -1.2071067812), (-32, -0.5))
            Line((-32, -0.5), (-32, -1.5))
            Line((-32, -1.5), (-31, -1.5))
        make_face()
    extrude(amount=F4_T144_DEPTH)

    split(bisect_by=Plane(origin=(0, -1.25, 1.25), x_dir=(1, 0, 0), z_dir=(0, -0.7071067812, 0.7071067812)), keep=Keep.TOP)

    split(bisect_by=Plane(origin=(-16.5, 0, 16.5), x_dir=(0, 1, 0), z_dir=(-0.7071067812, 0, 0.7071067812)), keep=Keep.TOP)

    split(bisect_by=Plane(origin=(0, 1.3, 1.3), x_dir=(1, 0, 0), z_dir=(0, -0.7071067812, -0.7071067812)), keep=Keep.TOP)

    split(bisect_by=Plane(origin=(-13.95, 0, -13.95), x_dir=(0, 1, 0), z_dir=(-0.7071067812, 0, -0.7071067812)), keep=Keep.TOP)


with BuildPart() as f1_23:
    add(f1_22.part)

    # F4_t141: union F4_tool142
    add(f4_tool142.part)


with BuildPart() as f4_tool150:
    # F4_s151 → F4_t152 (new body)
    with BuildSketch(Plane.XY.offset(-1.5)):
        with BuildLine():
            ThreePointArc((-31, -1.5), (-31.7071067812, -1.2071067812), (-32, -0.5))
            Line((-32, -0.5), (-32, -1.5))
            Line((-32, -1.5), (-31, -1.5))
        make_face()
    extrude(amount=F4_T152_DEPTH)

    split(bisect_by=Plane(origin=(0, 1.3, 1.3), x_dir=(1, 0, 0), z_dir=(0, 0.7071067812, 0.7071067812)), keep=Keep.TOP)

    split(bisect_by=Plane(origin=(-13.95, 0, -13.95), x_dir=(0, 1, 0), z_dir=(-0.7071067812, 0, -0.7071067812)), keep=Keep.TOP)


with BuildPart() as f1_24:
    add(f1_23.part)

    # F4_t149: union F4_tool150
    add(f4_tool150.part)


with BuildPart() as f4_tool156:
    # F4_s157 → F4_t158 (new body)
    with BuildSketch(Plane.XY.offset(-1.5)):
        with BuildLine():
            ThreePointArc((-31, -1.5), (-31.7071067812, -1.2071067812), (-32, -0.5))
            Line((-32, -0.5), (-32, -1.5))
            Line((-32, -1.5), (-31, -1.5))
        make_face()
    extrude(amount=F4_T158_DEPTH)

    split(bisect_by=Plane(origin=(0, 1.3, 1.3), x_dir=(1, 0, 0), z_dir=(0, -0.7071067812, -0.7071067812)), keep=Keep.TOP)

    split(bisect_by=Plane(origin=(-13.95, 0, -13.95), x_dir=(0, 1, 0), z_dir=(0.7071067812, 0, 0.7071067812)), keep=Keep.TOP)


with BuildPart() as f1_25:
    add(f1_24.part)

    # F4_t155: union F4_tool156
    add(f4_tool156.part)


with BuildPart() as f4_tool162:
    # F4_s163 → F4_t164 (new body)
    with BuildSketch(Plane.XY.offset(-1.5)):
        with BuildLine():
            ThreePointArc((-31, 2.5), (-31.7071067812, 2.7928932188), (-32, 3.5))
            Line((-32, 3.5), (-32, 2.5))
            Line((-32, 2.5), (-31, 2.5))
        make_face()
    extrude(amount=F4_T164_DEPTH)

    split(bisect_by=Plane(origin=(0, 0.75, -0.75), x_dir=(1, 0, 0), z_dir=(0, 0.7071067812, -0.7071067812)), keep=Keep.TOP)

    split(bisect_by=Plane(origin=(-16.5, 0, 16.5), x_dir=(0, 1, 0), z_dir=(-0.7071067812, 0, 0.7071067812)), keep=Keep.TOP)


with BuildPart() as f1_26:
    add(f1_25.part)

    # F4_t161: union F4_tool162
    add(f4_tool162.part)


with BuildPart() as f4_tool168:
    # F4_s169 → F4_t170 (new body)
    with BuildSketch(Plane.XY.offset(-1.5)):
        with BuildLine():
            ThreePointArc((-31, 2.5), (-31.7071067812, 2.7928932188), (-32, 3.5))
            Line((-32, 3.5), (-32, 2.5))
            Line((-32, 2.5), (-31, 2.5))
        make_face()
    extrude(amount=F4_T170_DEPTH)

    split(bisect_by=Plane(origin=(0, 0.75, -0.75), x_dir=(1, 0, 0), z_dir=(0, -0.7071067812, 0.7071067812)), keep=Keep.TOP)

    split(bisect_by=Plane(origin=(-16.5, 0, 16.5), x_dir=(0, 1, 0), z_dir=(0.7071067812, 0, -0.7071067812)), keep=Keep.TOP)


with BuildPart() as f1_27:
    add(f1_26.part)

    # F4_t167: union F4_tool168
    add(f4_tool168.part)


with BuildPart() as f4_tool174:
    # F4_s175 → F4_t176 (new body)
    with BuildSketch(Plane.XY.offset(-1.5)):
        with BuildLine():
            ThreePointArc((-31, 2.5), (-31.7071067812, 2.7928932188), (-32, 3.5))
            Line((-32, 3.5), (-32, 2.5))
            Line((-32, 2.5), (-31, 2.5))
        make_face()
    extrude(amount=F4_T176_DEPTH)

    split(bisect_by=Plane(origin=(0, 0.75, -0.75), x_dir=(1, 0, 0), z_dir=(0, -0.7071067812, 0.7071067812)), keep=Keep.TOP)

    split(bisect_by=Plane(origin=(-16.5, 0, 16.5), x_dir=(0, 1, 0), z_dir=(-0.7071067812, 0, 0.7071067812)), keep=Keep.TOP)

    split(bisect_by=Plane(origin=(0, 3.3, 3.3), x_dir=(1, 0, 0), z_dir=(0, -0.7071067812, -0.7071067812)), keep=Keep.TOP)

    split(bisect_by=Plane(origin=(-13.95, 0, -13.95), x_dir=(0, 1, 0), z_dir=(-0.7071067812, 0, -0.7071067812)), keep=Keep.TOP)


with BuildPart() as f1_28:
    add(f1_27.part)

    # F4_t173: union F4_tool174
    add(f4_tool174.part)


with BuildPart() as f4_tool182:
    # F4_s183 → F4_t184 (new body)
    with BuildSketch(Plane.XY.offset(-1.5)):
        with BuildLine():
            ThreePointArc((-31, 2.5), (-31.7071067812, 2.7928932188), (-32, 3.5))
            Line((-32, 3.5), (-32, 2.5))
            Line((-32, 2.5), (-31, 2.5))
        make_face()
    extrude(amount=F4_T184_DEPTH)

    split(bisect_by=Plane(origin=(0, 3.3, 3.3), x_dir=(1, 0, 0), z_dir=(0, 0.7071067812, 0.7071067812)), keep=Keep.TOP)

    split(bisect_by=Plane(origin=(-13.95, 0, -13.95), x_dir=(0, 1, 0), z_dir=(-0.7071067812, 0, -0.7071067812)), keep=Keep.TOP)


with BuildPart() as f1_29:
    add(f1_28.part)

    # F4_t181: union F4_tool182
    add(f4_tool182.part)


with BuildPart() as f4_tool188:
    # F4_s189 → F4_t190 (new body)
    with BuildSketch(Plane.XY.offset(-1.5)):
        with BuildLine():
            ThreePointArc((-31, 2.5), (-31.7071067812, 2.7928932188), (-32, 3.5))
            Line((-32, 3.5), (-32, 2.5))
            Line((-32, 2.5), (-31, 2.5))
        make_face()
    extrude(amount=F4_T190_DEPTH)

    split(bisect_by=Plane(origin=(0, 3.3, 3.3), x_dir=(1, 0, 0), z_dir=(0, -0.7071067812, -0.7071067812)), keep=Keep.TOP)

    split(bisect_by=Plane(origin=(-13.95, 0, -13.95), x_dir=(0, 1, 0), z_dir=(0.7071067812, 0, 0.7071067812)), keep=Keep.TOP)


with BuildPart() as f1_30:
    add(f1_29.part)

    # F4_t187: union F4_tool188
    add(f4_tool188.part)


with BuildPart() as f4_tool194:
    # F4_s195 → F4_t196 (new body)
    with BuildSketch(Plane.XY.offset(-1.5)):
        with BuildLine():
            ThreePointArc((-31, 4), (-31.7071067812, 3.7071067812), (-32, 3))
            Line((-32, 3), (-32, 4))
            Line((-32, 4), (-31, 4))
        make_face()
    extrude(amount=F4_T196_DEPTH)

    split(bisect_by=Plane(origin=(0, 2.5, 2.5), x_dir=(1, 0, 0), z_dir=(0, -0.7071067812, -0.7071067812)), keep=Keep.TOP)

    split(bisect_by=Plane(origin=(-16.5, 0, 16.5), x_dir=(0, 1, 0), z_dir=(-0.7071067812, 0, 0.7071067812)), keep=Keep.TOP)


with BuildPart() as f1_31:
    add(f1_30.part)

    # F4_t193: union F4_tool194
    add(f4_tool194.part)


with BuildPart() as f4_tool200:
    # F4_s201 → F4_t202 (new body)
    with BuildSketch(Plane.XY.offset(-1.5)):
        with BuildLine():
            ThreePointArc((-31, 4), (-31.7071067812, 3.7071067812), (-32, 3))
            Line((-32, 3), (-32, 4))
            Line((-32, 4), (-31, 4))
        make_face()
    extrude(amount=F4_T202_DEPTH)

    split(bisect_by=Plane(origin=(0, 2.5, 2.5), x_dir=(1, 0, 0), z_dir=(0, 0.7071067812, 0.7071067812)), keep=Keep.TOP)

    split(bisect_by=Plane(origin=(-16.5, 0, 16.5), x_dir=(0, 1, 0), z_dir=(0.7071067812, 0, -0.7071067812)), keep=Keep.TOP)


with BuildPart() as f1_32:
    add(f1_31.part)

    # F4_t199: union F4_tool200
    add(f4_tool200.part)


with BuildPart() as f4_tool206:
    # F4_s207 → F4_t208 (new body)
    with BuildSketch(Plane.XY.offset(-1.5)):
        with BuildLine():
            ThreePointArc((-31, 4), (-31.7071067812, 3.7071067812), (-32, 3))
            Line((-32, 3), (-32, 4))
            Line((-32, 4), (-31, 4))
        make_face()
    extrude(amount=F4_T208_DEPTH)

    split(bisect_by=Plane(origin=(0, 2.5, 2.5), x_dir=(1, 0, 0), z_dir=(0, 0.7071067812, 0.7071067812)), keep=Keep.TOP)

    split(bisect_by=Plane(origin=(-16.5, 0, 16.5), x_dir=(0, 1, 0), z_dir=(-0.7071067812, 0, 0.7071067812)), keep=Keep.TOP)

    split(bisect_by=Plane(origin=(0, -0.05, 0.05), x_dir=(1, 0, 0), z_dir=(0, 0.7071067812, -0.7071067812)), keep=Keep.TOP)

    split(bisect_by=Plane(origin=(-13.95, 0, -13.95), x_dir=(0, 1, 0), z_dir=(-0.7071067812, 0, -0.7071067812)), keep=Keep.TOP)


with BuildPart() as f1_33:
    add(f1_32.part)

    # F4_t205: union F4_tool206
    add(f4_tool206.part)


with BuildPart() as f4_tool214:
    # F4_s215 → F4_t216 (new body)
    with BuildSketch(Plane.XY.offset(-1.5)):
        with BuildLine():
            ThreePointArc((-31, 4), (-31.7071067812, 3.7071067812), (-32, 3))
            Line((-32, 3), (-32, 4))
            Line((-32, 4), (-31, 4))
        make_face()
    extrude(amount=F4_T216_DEPTH)

    split(bisect_by=Plane(origin=(0, -0.05, 0.05), x_dir=(1, 0, 0), z_dir=(0, -0.7071067812, 0.7071067812)), keep=Keep.TOP)

    split(bisect_by=Plane(origin=(-13.95, 0, -13.95), x_dir=(0, 1, 0), z_dir=(-0.7071067812, 0, -0.7071067812)), keep=Keep.TOP)


with BuildPart() as f1_34:
    add(f1_33.part)

    # F4_t213: union F4_tool214
    add(f4_tool214.part)


with BuildPart() as f4_tool220:
    # F4_s221 → F4_t222 (new body)
    with BuildSketch(Plane.XY.offset(-1.5)):
        with BuildLine():
            ThreePointArc((-31, 4), (-31.7071067812, 3.7071067812), (-32, 3))
            Line((-32, 3), (-32, 4))
            Line((-32, 4), (-31, 4))
        make_face()
    extrude(amount=F4_T222_DEPTH)

    split(bisect_by=Plane(origin=(0, -0.05, 0.05), x_dir=(1, 0, 0), z_dir=(0, 0.7071067812, -0.7071067812)), keep=Keep.TOP)

    split(bisect_by=Plane(origin=(-13.95, 0, -13.95), x_dir=(0, 1, 0), z_dir=(0.7071067812, 0, 0.7071067812)), keep=Keep.TOP)


with BuildPart() as f1_35:
    add(f1_34.part)

    # F4_t219: union F4_tool220
    add(f4_tool220.part)


with BuildPart() as f4_tool226:
    # F4_s227 → F4_t228 (new body)
    with BuildSketch(Plane.XY.offset(-1.5)):
        with BuildLine():
            ThreePointArc((-31, 0), (-31.7071067812, -0.2928932188), (-32, -1))
            Line((-32, -1), (-32, 0))
            Line((-32, 0), (-31, 0))
        make_face()
    extrude(amount=F4_T228_DEPTH)

    split(bisect_by=Plane(origin=(0, 0.5, 0.5), x_dir=(1, 0, 0), z_dir=(0, -0.7071067812, -0.7071067812)), keep=Keep.TOP)

    split(bisect_by=Plane(origin=(-16.5, 0, 16.5), x_dir=(0, 1, 0), z_dir=(-0.7071067812, 0, 0.7071067812)), keep=Keep.TOP)


with BuildPart() as f1_36:
    add(f1_35.part)

    # F4_t225: union F4_tool226
    add(f4_tool226.part)


with BuildPart() as f4_tool232:
    # F4_s233 → F4_t234 (new body)
    with BuildSketch(Plane.XY.offset(-1.5)):
        with BuildLine():
            ThreePointArc((-31, 0), (-31.7071067812, -0.2928932188), (-32, -1))
            Line((-32, -1), (-32, 0))
            Line((-32, 0), (-31, 0))
        make_face()
    extrude(amount=F4_T234_DEPTH)

    split(bisect_by=Plane(origin=(0, 0.5, 0.5), x_dir=(1, 0, 0), z_dir=(0, 0.7071067812, 0.7071067812)), keep=Keep.TOP)

    split(bisect_by=Plane(origin=(-16.5, 0, 16.5), x_dir=(0, 1, 0), z_dir=(0.7071067812, 0, -0.7071067812)), keep=Keep.TOP)


with BuildPart() as f1_37:
    add(f1_36.part)

    # F4_t231: union F4_tool232
    add(f4_tool232.part)


with BuildPart() as f4_tool238:
    # F4_s239 → F4_t240 (new body)
    with BuildSketch(Plane.XY.offset(-1.5)):
        with BuildLine():
            ThreePointArc((-31, 0), (-31.7071067812, -0.2928932188), (-32, -1))
            Line((-32, -1), (-32, 0))
            Line((-32, 0), (-31, 0))
        make_face()
    extrude(amount=F4_T240_DEPTH)

    split(bisect_by=Plane(origin=(0, 0.5, 0.5), x_dir=(1, 0, 0), z_dir=(0, 0.7071067812, 0.7071067812)), keep=Keep.TOP)

    split(bisect_by=Plane(origin=(-16.5, 0, 16.5), x_dir=(0, 1, 0), z_dir=(-0.7071067812, 0, 0.7071067812)), keep=Keep.TOP)

    split(bisect_by=Plane(origin=(0, -2.05, 2.05), x_dir=(1, 0, 0), z_dir=(0, 0.7071067812, -0.7071067812)), keep=Keep.TOP)

    split(bisect_by=Plane(origin=(-13.95, 0, -13.95), x_dir=(0, 1, 0), z_dir=(-0.7071067812, 0, -0.7071067812)), keep=Keep.TOP)


with BuildPart() as f1_38:
    add(f1_37.part)

    # F4_t237: union F4_tool238
    add(f4_tool238.part)


with BuildPart() as f4_tool246:
    # F4_s247 → F4_t248 (new body)
    with BuildSketch(Plane.XY.offset(-1.5)):
        with BuildLine():
            ThreePointArc((-31, 0), (-31.7071067812, -0.2928932188), (-32, -1))
            Line((-32, -1), (-32, 0))
            Line((-32, 0), (-31, 0))
        make_face()
    extrude(amount=F4_T248_DEPTH)

    split(bisect_by=Plane(origin=(0, -2.05, 2.05), x_dir=(1, 0, 0), z_dir=(0, -0.7071067812, 0.7071067812)), keep=Keep.TOP)

    split(bisect_by=Plane(origin=(-13.95, 0, -13.95), x_dir=(0, 1, 0), z_dir=(-0.7071067812, 0, -0.7071067812)), keep=Keep.TOP)


with BuildPart() as f1_39:
    add(f1_38.part)

    # F4_t245: union F4_tool246
    add(f4_tool246.part)


with BuildPart() as f4_tool252:
    # F4_s253 → F4_t254 (new body)
    with BuildSketch(Plane.XY.offset(-1.5)):
        with BuildLine():
            ThreePointArc((-31, 0), (-31.7071067812, -0.2928932188), (-32, -1))
            Line((-32, -1), (-32, 0))
            Line((-32, 0), (-31, 0))
        make_face()
    extrude(amount=F4_T254_DEPTH)

    split(bisect_by=Plane(origin=(0, -2.05, 2.05), x_dir=(1, 0, 0), z_dir=(0, 0.7071067812, -0.7071067812)), keep=Keep.TOP)

    split(bisect_by=Plane(origin=(-13.95, 0, -13.95), x_dir=(0, 1, 0), z_dir=(0.7071067812, 0, 0.7071067812)), keep=Keep.TOP)


with BuildPart() as f1_40:
    add(f1_39.part)

    # F4_t251: union F4_tool252
    add(f4_tool252.part)


solid = f1_40.part
